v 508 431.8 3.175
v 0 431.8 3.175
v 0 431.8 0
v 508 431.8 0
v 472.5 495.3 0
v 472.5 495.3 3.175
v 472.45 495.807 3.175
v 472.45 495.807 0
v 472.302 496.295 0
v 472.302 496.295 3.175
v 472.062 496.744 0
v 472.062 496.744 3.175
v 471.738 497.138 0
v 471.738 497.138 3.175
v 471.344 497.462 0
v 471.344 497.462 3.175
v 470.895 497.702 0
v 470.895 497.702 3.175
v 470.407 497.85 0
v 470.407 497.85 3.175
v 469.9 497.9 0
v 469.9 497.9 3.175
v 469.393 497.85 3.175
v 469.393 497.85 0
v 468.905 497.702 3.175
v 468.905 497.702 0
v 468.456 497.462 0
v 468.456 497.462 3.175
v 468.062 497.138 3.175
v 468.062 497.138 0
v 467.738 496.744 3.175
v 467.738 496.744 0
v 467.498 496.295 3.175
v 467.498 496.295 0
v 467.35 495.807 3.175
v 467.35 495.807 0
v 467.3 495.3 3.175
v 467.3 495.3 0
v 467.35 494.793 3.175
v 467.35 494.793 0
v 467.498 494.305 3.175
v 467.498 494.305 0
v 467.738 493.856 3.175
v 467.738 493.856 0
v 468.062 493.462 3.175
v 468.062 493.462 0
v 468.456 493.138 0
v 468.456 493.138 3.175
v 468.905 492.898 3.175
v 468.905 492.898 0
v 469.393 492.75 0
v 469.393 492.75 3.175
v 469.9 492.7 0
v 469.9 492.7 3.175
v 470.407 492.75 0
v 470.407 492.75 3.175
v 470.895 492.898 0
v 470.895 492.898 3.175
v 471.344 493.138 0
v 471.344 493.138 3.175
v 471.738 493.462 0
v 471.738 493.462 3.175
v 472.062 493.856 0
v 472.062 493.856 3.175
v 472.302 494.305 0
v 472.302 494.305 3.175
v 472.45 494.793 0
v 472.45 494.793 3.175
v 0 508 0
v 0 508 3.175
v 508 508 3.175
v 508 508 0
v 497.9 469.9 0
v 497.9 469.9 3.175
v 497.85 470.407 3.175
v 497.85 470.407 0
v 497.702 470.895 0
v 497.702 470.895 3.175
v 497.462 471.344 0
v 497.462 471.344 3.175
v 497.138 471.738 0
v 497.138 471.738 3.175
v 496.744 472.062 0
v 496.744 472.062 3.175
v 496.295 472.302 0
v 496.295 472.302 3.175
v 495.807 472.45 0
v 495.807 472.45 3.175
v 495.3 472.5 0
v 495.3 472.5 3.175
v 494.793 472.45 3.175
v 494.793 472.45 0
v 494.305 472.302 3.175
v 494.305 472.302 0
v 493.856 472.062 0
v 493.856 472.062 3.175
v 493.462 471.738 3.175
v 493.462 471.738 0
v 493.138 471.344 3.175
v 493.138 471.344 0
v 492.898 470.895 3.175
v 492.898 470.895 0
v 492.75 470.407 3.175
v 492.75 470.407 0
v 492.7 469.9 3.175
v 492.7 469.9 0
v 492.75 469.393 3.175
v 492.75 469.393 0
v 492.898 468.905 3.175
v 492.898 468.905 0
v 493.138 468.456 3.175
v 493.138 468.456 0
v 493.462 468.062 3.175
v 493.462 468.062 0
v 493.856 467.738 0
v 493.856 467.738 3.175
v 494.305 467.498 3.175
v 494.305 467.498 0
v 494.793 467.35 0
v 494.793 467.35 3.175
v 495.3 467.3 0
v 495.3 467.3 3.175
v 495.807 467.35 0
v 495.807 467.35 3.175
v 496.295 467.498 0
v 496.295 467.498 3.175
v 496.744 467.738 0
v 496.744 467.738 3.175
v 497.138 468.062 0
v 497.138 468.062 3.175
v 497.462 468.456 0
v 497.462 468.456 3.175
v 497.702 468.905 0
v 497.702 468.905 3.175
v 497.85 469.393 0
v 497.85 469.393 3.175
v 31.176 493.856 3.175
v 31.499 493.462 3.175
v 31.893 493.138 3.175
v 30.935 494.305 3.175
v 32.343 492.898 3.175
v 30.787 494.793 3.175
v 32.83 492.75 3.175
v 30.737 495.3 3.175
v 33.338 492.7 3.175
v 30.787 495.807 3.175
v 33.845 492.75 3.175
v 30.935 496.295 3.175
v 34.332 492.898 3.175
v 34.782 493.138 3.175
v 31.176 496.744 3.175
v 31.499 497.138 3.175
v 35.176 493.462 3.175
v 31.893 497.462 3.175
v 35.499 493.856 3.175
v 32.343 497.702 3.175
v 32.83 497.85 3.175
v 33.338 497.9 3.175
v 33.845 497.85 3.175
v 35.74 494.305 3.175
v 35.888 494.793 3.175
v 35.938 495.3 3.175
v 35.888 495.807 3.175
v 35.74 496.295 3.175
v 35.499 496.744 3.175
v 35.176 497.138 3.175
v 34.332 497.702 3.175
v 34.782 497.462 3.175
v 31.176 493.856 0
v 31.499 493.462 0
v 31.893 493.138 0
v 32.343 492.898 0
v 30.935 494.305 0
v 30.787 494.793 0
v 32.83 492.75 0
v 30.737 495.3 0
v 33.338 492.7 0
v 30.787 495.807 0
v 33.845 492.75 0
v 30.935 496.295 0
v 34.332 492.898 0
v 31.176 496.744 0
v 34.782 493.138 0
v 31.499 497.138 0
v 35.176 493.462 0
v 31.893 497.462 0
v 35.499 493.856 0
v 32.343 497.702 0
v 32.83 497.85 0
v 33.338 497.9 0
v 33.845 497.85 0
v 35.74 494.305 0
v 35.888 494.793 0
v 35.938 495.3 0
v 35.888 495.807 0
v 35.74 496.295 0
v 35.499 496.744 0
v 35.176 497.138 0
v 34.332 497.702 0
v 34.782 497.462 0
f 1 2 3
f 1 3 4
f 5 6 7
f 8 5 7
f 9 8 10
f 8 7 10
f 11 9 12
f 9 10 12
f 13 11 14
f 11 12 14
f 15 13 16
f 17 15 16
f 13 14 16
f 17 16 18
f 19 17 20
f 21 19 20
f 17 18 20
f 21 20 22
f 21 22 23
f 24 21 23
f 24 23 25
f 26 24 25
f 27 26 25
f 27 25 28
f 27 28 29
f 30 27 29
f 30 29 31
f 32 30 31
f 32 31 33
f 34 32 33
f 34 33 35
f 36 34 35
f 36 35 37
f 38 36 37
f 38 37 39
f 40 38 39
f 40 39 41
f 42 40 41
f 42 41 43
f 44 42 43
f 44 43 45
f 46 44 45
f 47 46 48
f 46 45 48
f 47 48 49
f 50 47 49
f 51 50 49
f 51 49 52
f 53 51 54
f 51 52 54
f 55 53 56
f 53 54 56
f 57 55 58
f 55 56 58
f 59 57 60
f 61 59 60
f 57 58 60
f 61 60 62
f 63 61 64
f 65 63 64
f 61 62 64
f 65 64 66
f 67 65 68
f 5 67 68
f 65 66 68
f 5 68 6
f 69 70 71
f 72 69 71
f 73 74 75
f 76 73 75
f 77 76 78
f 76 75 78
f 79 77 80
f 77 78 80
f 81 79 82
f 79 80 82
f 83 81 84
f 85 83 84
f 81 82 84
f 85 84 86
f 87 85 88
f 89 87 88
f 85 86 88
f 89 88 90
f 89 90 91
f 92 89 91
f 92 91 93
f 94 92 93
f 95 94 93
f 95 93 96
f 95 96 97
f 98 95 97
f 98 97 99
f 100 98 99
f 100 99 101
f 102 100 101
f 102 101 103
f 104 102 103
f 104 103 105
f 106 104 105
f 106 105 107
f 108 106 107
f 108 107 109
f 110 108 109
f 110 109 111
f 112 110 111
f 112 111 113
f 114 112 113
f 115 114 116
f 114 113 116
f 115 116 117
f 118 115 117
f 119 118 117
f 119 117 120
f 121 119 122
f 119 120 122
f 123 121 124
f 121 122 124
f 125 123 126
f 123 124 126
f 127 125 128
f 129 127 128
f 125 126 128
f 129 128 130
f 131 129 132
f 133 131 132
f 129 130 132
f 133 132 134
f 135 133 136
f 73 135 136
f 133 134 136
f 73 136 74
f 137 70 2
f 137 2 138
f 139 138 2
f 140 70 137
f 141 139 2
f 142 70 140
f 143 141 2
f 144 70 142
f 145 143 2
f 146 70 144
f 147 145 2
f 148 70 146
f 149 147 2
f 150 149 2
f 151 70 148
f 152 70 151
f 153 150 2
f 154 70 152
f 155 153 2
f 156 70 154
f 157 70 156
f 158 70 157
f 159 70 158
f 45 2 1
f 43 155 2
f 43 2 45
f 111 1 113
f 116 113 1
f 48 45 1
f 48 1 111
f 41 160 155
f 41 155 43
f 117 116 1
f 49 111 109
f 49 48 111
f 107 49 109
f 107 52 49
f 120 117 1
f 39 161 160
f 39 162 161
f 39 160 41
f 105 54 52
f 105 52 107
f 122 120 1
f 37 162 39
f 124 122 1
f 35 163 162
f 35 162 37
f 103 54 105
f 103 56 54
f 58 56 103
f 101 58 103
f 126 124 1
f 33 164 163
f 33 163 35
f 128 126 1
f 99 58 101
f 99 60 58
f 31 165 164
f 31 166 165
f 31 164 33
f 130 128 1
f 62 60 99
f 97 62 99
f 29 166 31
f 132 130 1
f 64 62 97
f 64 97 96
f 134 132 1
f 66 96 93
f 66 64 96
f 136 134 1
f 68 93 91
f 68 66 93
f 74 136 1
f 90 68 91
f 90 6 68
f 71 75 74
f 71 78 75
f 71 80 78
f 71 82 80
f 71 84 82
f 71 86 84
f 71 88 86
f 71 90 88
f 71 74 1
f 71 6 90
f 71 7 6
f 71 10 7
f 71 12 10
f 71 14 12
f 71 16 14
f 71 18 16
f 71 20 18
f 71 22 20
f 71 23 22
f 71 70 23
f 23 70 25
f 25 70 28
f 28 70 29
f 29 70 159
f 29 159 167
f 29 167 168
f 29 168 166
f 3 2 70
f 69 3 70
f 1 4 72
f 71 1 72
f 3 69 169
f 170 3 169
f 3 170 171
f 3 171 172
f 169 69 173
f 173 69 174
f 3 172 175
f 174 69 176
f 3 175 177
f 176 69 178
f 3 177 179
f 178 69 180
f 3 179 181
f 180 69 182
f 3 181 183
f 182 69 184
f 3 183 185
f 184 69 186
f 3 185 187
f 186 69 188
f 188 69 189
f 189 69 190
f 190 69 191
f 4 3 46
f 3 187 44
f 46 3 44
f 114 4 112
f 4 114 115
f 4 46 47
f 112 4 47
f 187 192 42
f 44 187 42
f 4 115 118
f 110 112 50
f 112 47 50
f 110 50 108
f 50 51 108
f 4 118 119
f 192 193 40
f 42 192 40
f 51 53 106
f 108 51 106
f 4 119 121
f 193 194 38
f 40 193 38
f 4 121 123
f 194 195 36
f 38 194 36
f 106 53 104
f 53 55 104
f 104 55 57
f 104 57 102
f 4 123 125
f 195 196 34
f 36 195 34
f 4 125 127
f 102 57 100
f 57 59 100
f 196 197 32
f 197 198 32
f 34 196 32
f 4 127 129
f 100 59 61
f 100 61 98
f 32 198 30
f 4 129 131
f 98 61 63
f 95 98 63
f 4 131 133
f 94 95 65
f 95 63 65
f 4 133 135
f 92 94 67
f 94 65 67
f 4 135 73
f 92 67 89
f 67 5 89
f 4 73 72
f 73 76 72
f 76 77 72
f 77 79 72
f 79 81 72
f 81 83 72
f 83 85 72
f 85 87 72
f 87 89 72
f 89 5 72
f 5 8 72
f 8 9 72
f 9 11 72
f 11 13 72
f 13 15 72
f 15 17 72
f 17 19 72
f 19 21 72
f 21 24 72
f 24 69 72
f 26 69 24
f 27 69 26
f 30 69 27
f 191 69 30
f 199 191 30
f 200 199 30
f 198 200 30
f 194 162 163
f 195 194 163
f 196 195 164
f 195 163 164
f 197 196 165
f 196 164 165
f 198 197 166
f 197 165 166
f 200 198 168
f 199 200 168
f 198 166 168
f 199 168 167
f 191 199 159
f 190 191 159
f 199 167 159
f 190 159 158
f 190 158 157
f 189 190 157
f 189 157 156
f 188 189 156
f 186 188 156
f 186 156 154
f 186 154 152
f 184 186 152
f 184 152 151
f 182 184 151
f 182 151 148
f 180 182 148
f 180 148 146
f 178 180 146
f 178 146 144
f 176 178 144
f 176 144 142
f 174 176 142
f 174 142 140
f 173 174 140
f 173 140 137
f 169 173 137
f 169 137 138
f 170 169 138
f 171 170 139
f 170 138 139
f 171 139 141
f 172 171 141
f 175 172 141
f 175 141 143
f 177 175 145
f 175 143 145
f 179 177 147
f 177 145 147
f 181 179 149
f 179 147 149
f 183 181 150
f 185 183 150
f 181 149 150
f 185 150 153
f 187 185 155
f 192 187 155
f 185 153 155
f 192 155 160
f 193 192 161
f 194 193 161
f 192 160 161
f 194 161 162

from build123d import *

# Parameters (mm, degrees)
SKETCH1_W           = 508
SKETCH1_H           = 508
BOSS_EXTRUDE1_DEPTH = 3.175
SKETCH2_R           = 2.54
SKETCH2_W           = 234.95
SKETCH2_H           = 368.3
CUT_EXTRUDE1_DEPTH  = 44.45
SKETCH4_R           = 2.159
CUT_EXTRUDE3_DEPTH  = 719.427505476
SKETCH5_R           = 2.6
CUT_EXTRUDE4_DEPTH  = 719.427505476
SKETCH6_W           = 20.6375
SKETCH6_H           = 119.54625
BOSS_EXTRUDE3_DEPTH = 3.175
SKETCH7_W           = 508
SKETCH7_H           = 431.8
CUT_EXTRUDE5_DEPTH  = 719.427505476


with BuildPart() as part:
    # Sketch1 → Boss-Extrude1 (new body)
    with BuildSketch(Plane.XY):
        with Locations((254, 254)):
            Rectangle(SKETCH1_W, SKETCH1_H)
    extrude(amount=BOSS_EXTRUDE1_DEPTH)

    # Sketch2 → Cut-Extrude1 (cut)
    with BuildSketch(Plane(origin=(0, 0, 0), x_dir=(-1, 0, 0), z_dir=(0, 0, -1))):
        with Locations((-339.725, 45.085)):
            Circle(SKETCH2_R)
        with Locations((-85.725, 45.085)):
            Circle(SKETCH2_R)
        with Locations((-339.725, 75.565)):
            Circle(SKETCH2_R)
        with Locations((-85.725, 75.565)):
            Circle(SKETCH2_R)
        with Locations((-212.725, 184.15)):
            Rectangle(SKETCH2_W, SKETCH2_H)
        Polygon((0, 403.06625), (0, 328.45375), (-20.6375, 328.45375), (-20.6375, 403.06625), (-20.6375, 508), (0, 508), align=None)
    extrude(amount=-CUT_EXTRUDE1_DEPTH, mode=Mode.SUBTRACT)

    # Sketch4 → Cut-Extrude3 (cut, through all)
    with BuildSketch(Plane(origin=(0, 0, 0), x_dir=(-1, 0, 0), z_dir=(0, 0, -1))):
        with Locations((-311.1754, 390.779)):
            Circle(SKETCH4_R)
        with Locations((-277.1394, 390.779)):
            Circle(SKETCH4_R)
        with Locations((-148.3614, 390.779)):
            Circle(SKETCH4_R)
        with Locations((-114.3254, 390.779)):
            Circle(SKETCH4_R)
    extrude(amount=-CUT_EXTRUDE3_DEPTH, mode=Mode.SUBTRACT)

    # Sketch5 → Cut-Extrude4 (cut, through all)
    with BuildSketch(Plane.XY.offset(3.175)):
        with Locations((12.7, 303.05375)):
            Circle(SKETCH5_R)
        with Locations((12.7, 177.8)):
            Circle(SKETCH5_R)
        with Locations((12.7, 38.1)):
            Circle(SKETCH5_R)
        with Locations((495.3, 38.1)):
            Circle(SKETCH5_R)
        with Locations((495.3, 177.8)):
            Circle(SKETCH5_R)
        with Locations((495.3, 303.05375)):
            Circle(SKETCH5_R)
        with Locations((495.3, 469.9)):
            Circle(SKETCH5_R)
        with Locations((57.15, 12.7)):
            Circle(SKETCH5_R)
        with Locations((368.3, 12.7)):
            Circle(SKETCH5_R)
        with Locations((444.5, 12.7)):
            Circle(SKETCH5_R)
        with Locations((33.3375, 495.3)):
            Circle(SKETCH5_R)
        with Locations((469.9, 495.3)):
            Circle(SKETCH5_R)
    extrude(amount=-CUT_EXTRUDE4_DEPTH, mode=Mode.SUBTRACT)

    # Sketch6 → Boss-Extrude3 (add)
    with BuildSketch(Plane.XY.offset(3.175)):
        with Locations((10.31875, 448.226875)):
            Rectangle(SKETCH6_W, SKETCH6_H)
    extrude(amount=-BOSS_EXTRUDE3_DEPTH)

    # Sketch7 → Cut-Extrude5 (cut, through all)
    with BuildSketch(Plane.XY.offset(3.175)):
        with Locations((254, 215.9)):
            Rectangle(SKETCH7_W, SKETCH7_H)
    extrude(amount=-CUT_EXTRUDE5_DEPTH, mode=Mode.SUBTRACT)


solid = part.part
